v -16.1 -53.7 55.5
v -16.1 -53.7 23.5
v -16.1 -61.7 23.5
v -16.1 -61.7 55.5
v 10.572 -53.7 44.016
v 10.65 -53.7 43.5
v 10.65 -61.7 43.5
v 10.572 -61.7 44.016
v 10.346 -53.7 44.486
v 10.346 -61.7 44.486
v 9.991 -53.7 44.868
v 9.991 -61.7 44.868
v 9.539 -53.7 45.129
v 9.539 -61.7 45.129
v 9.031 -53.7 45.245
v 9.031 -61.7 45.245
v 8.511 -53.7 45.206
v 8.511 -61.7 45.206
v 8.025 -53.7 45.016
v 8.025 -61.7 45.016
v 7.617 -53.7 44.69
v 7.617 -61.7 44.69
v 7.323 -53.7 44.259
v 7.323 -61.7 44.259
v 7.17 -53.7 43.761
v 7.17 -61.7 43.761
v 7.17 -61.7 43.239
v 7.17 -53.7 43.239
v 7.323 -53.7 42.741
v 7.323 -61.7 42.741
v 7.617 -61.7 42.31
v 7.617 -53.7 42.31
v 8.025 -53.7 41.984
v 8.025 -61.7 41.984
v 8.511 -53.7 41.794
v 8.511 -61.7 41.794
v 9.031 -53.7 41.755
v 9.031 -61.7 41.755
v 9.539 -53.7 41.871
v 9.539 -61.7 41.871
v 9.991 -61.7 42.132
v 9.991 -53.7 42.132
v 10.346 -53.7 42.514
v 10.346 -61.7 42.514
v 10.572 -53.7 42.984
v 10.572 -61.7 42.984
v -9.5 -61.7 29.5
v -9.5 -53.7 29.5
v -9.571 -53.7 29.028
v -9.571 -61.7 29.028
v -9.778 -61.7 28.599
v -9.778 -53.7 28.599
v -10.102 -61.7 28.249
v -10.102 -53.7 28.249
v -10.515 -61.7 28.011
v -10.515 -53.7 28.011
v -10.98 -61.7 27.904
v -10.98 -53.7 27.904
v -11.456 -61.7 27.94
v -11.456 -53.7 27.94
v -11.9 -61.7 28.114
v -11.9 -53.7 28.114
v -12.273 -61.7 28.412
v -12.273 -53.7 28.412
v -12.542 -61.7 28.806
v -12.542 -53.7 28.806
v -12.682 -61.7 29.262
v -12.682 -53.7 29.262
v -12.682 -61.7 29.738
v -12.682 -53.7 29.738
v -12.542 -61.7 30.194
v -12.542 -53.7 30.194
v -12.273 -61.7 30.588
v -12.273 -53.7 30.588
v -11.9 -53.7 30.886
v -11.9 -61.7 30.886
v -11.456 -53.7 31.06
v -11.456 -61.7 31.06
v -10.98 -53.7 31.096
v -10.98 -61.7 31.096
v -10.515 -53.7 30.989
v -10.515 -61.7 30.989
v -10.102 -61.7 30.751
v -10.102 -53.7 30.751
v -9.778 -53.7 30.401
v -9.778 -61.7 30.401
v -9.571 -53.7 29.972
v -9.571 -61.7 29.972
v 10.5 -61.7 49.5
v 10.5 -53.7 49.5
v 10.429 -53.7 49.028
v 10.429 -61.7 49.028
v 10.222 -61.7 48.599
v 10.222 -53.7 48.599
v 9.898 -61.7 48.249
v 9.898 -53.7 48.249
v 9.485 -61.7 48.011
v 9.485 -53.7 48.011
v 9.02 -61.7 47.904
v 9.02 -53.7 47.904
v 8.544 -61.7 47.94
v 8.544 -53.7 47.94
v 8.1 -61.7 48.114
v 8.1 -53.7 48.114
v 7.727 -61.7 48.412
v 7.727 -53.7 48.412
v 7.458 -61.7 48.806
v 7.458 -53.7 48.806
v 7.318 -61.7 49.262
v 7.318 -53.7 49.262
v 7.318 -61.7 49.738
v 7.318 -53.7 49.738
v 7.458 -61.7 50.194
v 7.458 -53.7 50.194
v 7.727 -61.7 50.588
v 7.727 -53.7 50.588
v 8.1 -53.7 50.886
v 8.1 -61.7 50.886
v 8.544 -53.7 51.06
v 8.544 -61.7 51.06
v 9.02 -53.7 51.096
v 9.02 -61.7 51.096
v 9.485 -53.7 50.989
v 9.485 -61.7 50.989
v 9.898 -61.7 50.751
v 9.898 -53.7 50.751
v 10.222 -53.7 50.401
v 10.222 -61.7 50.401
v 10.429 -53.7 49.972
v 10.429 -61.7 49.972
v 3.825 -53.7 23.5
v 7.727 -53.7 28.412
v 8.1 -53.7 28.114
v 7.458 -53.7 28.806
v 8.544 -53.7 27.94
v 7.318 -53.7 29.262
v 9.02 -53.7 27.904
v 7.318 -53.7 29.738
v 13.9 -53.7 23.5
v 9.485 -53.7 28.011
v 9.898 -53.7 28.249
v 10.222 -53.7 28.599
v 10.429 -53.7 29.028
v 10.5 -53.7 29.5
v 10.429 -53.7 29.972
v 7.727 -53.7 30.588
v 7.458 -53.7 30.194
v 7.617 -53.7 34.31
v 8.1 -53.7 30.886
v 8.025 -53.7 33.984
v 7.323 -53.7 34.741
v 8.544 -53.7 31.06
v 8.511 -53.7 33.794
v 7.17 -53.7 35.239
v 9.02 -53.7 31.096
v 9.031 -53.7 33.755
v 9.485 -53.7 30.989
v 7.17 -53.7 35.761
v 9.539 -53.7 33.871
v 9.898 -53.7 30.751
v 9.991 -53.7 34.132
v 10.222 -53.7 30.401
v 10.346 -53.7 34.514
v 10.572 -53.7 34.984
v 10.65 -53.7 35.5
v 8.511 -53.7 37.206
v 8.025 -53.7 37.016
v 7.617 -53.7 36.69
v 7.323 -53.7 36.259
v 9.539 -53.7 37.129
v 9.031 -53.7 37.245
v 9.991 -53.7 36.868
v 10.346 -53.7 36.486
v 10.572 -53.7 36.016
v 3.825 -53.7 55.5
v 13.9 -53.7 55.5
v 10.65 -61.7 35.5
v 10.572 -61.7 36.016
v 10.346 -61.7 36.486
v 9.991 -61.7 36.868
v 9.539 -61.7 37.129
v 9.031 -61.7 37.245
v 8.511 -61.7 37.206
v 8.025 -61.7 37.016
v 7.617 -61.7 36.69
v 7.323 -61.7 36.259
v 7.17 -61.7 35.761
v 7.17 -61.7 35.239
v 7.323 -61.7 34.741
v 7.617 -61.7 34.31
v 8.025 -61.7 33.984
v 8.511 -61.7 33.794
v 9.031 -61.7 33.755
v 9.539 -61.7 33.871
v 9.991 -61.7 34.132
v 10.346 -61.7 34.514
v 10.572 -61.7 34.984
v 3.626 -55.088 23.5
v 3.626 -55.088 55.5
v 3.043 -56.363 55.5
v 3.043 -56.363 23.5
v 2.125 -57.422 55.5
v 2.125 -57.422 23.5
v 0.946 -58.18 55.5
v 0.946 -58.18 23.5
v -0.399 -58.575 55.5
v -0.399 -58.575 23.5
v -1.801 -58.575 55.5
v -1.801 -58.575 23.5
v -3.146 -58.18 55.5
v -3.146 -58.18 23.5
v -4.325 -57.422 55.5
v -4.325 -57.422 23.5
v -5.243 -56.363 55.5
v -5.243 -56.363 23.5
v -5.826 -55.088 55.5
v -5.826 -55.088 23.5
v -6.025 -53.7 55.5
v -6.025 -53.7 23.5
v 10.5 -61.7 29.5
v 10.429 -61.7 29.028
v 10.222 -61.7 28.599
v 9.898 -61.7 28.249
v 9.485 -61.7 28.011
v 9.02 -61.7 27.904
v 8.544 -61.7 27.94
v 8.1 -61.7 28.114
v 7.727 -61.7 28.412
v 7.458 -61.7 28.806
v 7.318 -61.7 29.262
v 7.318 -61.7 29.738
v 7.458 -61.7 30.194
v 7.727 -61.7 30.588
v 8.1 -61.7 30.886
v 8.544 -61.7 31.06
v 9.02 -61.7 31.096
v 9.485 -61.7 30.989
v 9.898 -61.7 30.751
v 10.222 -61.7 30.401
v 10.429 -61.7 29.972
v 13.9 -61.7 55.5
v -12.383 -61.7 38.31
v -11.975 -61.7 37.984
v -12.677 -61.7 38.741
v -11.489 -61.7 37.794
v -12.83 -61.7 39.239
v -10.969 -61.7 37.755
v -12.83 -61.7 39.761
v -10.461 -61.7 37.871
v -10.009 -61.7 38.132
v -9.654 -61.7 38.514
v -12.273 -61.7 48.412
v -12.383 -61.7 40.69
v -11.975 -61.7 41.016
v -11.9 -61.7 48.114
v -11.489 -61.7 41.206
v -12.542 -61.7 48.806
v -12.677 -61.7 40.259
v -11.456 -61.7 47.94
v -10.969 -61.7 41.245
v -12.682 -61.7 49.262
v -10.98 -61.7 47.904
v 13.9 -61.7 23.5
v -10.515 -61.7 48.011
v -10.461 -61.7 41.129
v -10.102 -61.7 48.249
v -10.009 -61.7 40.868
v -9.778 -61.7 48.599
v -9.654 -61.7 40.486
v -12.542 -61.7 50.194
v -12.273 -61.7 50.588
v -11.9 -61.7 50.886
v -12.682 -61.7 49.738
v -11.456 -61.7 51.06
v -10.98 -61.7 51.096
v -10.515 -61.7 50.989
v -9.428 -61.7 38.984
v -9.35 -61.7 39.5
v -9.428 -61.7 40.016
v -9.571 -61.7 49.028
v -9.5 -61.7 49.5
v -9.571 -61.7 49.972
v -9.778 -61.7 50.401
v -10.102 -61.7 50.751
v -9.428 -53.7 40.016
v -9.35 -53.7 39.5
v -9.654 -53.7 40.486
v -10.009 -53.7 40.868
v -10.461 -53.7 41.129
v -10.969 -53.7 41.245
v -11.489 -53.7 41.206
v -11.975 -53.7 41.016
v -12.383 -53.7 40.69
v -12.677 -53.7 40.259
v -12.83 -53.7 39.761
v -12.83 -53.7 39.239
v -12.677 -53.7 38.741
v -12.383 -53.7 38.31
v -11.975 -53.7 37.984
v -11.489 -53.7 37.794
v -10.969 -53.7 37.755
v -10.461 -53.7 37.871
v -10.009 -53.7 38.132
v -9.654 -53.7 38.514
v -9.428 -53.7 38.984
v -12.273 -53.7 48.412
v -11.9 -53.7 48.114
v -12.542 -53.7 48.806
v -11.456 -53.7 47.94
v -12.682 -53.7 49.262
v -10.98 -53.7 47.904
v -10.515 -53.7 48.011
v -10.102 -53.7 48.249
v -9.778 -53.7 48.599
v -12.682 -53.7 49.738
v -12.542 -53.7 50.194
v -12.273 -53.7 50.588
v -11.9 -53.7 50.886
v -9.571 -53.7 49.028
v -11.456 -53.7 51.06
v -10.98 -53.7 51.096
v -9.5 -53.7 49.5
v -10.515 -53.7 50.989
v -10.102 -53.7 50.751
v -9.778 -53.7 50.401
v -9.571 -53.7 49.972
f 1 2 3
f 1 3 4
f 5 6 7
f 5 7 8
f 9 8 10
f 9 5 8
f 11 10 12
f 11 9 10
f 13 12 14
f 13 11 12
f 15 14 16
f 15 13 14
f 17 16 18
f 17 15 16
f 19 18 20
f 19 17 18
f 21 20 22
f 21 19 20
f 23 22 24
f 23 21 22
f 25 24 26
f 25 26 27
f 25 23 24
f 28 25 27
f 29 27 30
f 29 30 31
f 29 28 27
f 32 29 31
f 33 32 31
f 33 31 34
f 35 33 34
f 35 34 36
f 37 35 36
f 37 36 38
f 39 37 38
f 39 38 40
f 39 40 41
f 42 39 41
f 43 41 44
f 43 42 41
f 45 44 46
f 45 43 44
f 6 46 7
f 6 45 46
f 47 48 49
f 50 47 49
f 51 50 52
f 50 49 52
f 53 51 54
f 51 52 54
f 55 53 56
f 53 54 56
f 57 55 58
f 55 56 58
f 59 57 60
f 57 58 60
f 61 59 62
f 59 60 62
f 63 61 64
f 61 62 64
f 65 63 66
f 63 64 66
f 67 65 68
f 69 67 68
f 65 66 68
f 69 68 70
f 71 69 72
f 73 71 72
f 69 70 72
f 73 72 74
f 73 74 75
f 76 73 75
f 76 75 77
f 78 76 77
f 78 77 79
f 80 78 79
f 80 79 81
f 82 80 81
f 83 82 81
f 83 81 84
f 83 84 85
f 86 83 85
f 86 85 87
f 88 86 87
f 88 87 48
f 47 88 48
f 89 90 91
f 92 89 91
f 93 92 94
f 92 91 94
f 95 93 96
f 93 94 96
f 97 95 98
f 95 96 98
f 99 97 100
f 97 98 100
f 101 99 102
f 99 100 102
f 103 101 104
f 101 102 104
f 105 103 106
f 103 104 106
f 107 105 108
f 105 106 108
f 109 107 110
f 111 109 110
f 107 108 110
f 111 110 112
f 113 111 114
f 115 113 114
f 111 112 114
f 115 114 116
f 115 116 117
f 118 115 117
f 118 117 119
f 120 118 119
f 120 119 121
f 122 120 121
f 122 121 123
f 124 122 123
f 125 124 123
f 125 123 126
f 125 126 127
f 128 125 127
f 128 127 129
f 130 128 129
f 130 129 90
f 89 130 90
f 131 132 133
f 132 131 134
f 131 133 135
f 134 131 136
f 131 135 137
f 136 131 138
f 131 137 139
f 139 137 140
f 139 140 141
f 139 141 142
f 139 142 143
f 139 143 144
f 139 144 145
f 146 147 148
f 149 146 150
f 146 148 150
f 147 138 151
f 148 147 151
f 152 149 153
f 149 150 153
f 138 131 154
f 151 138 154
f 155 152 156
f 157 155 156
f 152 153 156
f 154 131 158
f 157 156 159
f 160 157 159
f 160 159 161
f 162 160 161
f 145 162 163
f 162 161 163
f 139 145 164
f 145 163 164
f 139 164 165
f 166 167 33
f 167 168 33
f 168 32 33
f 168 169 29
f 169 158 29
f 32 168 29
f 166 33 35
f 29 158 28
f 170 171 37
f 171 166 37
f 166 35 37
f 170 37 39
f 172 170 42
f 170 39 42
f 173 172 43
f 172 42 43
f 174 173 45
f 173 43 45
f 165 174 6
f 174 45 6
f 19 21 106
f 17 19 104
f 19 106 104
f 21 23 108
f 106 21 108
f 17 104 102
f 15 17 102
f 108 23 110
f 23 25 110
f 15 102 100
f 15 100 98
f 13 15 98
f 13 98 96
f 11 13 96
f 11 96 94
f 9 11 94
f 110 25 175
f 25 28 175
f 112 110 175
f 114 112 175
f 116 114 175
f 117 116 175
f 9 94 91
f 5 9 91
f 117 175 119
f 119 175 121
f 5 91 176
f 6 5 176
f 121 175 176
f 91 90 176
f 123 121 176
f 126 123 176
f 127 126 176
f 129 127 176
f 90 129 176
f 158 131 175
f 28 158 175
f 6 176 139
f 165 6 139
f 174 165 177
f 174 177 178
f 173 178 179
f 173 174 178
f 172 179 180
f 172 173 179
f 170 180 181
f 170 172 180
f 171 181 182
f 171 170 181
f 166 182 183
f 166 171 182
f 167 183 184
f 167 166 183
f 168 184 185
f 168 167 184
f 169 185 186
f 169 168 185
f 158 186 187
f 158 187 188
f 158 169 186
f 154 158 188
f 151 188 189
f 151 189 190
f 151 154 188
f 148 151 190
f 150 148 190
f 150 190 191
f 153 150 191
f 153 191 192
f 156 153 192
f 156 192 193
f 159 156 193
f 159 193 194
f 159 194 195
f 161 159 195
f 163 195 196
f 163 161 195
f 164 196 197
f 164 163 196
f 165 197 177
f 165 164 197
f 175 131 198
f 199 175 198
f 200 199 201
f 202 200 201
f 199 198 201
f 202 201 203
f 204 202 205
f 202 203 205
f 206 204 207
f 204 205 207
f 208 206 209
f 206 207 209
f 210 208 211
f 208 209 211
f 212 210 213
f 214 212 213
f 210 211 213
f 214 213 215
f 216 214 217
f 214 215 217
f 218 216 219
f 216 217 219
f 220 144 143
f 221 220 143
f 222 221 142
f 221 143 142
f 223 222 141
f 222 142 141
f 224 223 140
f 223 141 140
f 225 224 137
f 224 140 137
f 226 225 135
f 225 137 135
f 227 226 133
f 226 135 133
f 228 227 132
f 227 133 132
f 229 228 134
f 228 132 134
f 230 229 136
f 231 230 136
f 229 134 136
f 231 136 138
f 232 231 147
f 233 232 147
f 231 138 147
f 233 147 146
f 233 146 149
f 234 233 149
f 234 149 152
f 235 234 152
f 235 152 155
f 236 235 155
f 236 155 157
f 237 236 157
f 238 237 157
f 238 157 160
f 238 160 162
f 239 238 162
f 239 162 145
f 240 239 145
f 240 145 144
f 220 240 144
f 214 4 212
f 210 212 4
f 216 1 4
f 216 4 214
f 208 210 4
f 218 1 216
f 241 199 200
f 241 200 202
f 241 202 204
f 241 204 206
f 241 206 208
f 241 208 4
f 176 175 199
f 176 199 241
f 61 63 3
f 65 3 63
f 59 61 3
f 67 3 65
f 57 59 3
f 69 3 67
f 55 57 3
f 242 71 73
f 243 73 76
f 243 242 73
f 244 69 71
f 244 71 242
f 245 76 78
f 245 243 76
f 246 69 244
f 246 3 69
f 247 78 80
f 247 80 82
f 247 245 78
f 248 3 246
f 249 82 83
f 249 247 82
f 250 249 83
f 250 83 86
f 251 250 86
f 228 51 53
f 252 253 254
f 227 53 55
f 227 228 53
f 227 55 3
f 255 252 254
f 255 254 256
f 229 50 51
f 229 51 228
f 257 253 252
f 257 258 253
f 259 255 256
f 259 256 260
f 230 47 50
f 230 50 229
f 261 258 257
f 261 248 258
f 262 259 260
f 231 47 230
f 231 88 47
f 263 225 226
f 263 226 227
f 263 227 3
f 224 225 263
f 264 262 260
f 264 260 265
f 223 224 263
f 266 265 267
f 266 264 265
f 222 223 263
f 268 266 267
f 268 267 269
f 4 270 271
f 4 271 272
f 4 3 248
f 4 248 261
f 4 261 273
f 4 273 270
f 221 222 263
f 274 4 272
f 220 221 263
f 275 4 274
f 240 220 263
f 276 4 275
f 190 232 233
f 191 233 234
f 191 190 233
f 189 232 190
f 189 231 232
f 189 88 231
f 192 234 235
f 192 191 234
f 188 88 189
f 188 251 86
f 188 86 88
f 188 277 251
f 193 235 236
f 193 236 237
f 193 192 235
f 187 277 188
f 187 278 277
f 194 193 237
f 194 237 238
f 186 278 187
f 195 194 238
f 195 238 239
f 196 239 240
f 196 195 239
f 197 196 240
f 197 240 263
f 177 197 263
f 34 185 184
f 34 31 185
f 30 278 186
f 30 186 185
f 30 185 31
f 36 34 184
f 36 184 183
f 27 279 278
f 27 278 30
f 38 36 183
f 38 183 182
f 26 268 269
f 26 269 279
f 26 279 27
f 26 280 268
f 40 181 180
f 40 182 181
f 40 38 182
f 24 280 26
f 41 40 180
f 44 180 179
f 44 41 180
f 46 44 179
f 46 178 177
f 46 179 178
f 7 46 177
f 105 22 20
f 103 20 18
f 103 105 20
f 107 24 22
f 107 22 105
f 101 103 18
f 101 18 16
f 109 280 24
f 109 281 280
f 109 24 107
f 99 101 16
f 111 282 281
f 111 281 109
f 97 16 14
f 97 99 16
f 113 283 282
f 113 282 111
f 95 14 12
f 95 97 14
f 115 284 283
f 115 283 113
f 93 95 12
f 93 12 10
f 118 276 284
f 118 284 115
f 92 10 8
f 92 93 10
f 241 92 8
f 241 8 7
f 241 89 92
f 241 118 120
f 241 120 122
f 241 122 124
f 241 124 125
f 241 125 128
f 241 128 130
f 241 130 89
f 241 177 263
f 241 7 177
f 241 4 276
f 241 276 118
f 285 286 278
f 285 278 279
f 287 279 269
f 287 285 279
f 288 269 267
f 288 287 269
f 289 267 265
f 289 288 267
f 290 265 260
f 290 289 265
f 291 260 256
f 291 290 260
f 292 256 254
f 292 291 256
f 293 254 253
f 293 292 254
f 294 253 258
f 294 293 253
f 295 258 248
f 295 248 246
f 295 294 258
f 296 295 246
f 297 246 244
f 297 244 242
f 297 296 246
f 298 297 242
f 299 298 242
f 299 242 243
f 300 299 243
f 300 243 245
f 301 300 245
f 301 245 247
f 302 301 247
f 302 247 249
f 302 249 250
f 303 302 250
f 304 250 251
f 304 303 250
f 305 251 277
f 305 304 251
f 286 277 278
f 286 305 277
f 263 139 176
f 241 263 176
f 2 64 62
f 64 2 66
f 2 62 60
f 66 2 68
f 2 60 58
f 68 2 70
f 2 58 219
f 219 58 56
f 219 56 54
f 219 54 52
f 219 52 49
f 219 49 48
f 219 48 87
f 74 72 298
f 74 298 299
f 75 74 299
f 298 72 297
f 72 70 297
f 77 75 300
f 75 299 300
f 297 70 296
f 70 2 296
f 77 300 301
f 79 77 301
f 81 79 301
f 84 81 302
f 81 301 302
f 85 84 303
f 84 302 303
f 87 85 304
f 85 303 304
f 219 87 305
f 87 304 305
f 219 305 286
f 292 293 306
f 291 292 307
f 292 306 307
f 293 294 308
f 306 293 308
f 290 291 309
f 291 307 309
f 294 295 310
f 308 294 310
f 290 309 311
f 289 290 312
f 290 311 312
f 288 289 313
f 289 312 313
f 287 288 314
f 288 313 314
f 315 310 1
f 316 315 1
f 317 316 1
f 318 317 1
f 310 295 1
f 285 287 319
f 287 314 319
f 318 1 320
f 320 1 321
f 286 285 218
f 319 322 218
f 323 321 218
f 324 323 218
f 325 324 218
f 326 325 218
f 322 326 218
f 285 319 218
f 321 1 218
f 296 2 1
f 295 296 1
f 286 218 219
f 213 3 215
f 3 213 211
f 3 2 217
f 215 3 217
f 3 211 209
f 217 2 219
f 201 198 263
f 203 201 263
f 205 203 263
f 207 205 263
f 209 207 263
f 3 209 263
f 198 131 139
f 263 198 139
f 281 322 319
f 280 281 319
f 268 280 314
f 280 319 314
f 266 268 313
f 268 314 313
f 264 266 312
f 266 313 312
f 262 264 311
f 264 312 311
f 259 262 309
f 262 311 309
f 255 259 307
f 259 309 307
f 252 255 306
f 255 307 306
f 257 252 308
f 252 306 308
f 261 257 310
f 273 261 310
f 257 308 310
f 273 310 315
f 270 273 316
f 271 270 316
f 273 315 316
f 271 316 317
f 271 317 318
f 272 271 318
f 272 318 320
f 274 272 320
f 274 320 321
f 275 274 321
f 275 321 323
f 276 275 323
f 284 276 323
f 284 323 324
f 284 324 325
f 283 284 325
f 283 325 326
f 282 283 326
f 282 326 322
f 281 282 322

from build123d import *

# Parameters (mm, degrees)
SKETCH063_W     = 30
SKETCH063_H     = 32
SKETCH063_R     = 1.75
PAD039_DEPTH    = 8
SKETCH064_R     = 4.925
POCKET025_DEPTH = 38
SKETCH065_R     = 1.6
POCKET026_DEPTH = 10


with BuildPart() as part:
    # Sketch063 → Pad039 (new body)
    with BuildSketch(Plane.XZ):
        Rectangle(SKETCH063_W, SKETCH063_H)
        with Locations((-10, 0)):
            Circle(SKETCH063_R, mode=Mode.SUBTRACT)
        with Locations((10, 4)):
            Circle(SKETCH063_R, mode=Mode.SUBTRACT)
        with Locations((10, -4)):
            Circle(SKETCH063_R, mode=Mode.SUBTRACT)
    extrude(amount=PAD039_DEPTH)

    # Sketch064 (on Face3 of Pad039) → Pocket025 (cut)
    with BuildSketch(Plane(origin=(0, 0, -16), x_dir=(1, 0, 0), z_dir=(0, 0, -1))):
        Circle(SKETCH064_R)
    extrude(amount=-POCKET025_DEPTH, mode=Mode.SUBTRACT)

    # Sketch065 (on Face2 of Pocket025) → Pocket026 (cut)
    with BuildSketch(Plane(origin=(0, 0, 0), x_dir=(1, 0, 0), z_dir=(0, 1, 0))):
        with Locations((26.925, 5)):
            Circle(SKETCH065_R)
        with Locations((-10, 10)):
            Circle(SKETCH065_R)
        with Locations((10, 10)):
            Circle(SKETCH065_R)
        with Locations((10, -10)):
            Circle(SKETCH065_R)
        with Locations((-10, -10)):
            Circle(SKETCH065_R)
    extrude(amount=-POCKET026_DEPTH, mode=Mode.SUBTRACT)


with BuildPart() as part_1:
    # Body011 placement: moved
    add(part.part.moved(Location((-1.1, -53.7, 39.5))))


solid = part_1.part
